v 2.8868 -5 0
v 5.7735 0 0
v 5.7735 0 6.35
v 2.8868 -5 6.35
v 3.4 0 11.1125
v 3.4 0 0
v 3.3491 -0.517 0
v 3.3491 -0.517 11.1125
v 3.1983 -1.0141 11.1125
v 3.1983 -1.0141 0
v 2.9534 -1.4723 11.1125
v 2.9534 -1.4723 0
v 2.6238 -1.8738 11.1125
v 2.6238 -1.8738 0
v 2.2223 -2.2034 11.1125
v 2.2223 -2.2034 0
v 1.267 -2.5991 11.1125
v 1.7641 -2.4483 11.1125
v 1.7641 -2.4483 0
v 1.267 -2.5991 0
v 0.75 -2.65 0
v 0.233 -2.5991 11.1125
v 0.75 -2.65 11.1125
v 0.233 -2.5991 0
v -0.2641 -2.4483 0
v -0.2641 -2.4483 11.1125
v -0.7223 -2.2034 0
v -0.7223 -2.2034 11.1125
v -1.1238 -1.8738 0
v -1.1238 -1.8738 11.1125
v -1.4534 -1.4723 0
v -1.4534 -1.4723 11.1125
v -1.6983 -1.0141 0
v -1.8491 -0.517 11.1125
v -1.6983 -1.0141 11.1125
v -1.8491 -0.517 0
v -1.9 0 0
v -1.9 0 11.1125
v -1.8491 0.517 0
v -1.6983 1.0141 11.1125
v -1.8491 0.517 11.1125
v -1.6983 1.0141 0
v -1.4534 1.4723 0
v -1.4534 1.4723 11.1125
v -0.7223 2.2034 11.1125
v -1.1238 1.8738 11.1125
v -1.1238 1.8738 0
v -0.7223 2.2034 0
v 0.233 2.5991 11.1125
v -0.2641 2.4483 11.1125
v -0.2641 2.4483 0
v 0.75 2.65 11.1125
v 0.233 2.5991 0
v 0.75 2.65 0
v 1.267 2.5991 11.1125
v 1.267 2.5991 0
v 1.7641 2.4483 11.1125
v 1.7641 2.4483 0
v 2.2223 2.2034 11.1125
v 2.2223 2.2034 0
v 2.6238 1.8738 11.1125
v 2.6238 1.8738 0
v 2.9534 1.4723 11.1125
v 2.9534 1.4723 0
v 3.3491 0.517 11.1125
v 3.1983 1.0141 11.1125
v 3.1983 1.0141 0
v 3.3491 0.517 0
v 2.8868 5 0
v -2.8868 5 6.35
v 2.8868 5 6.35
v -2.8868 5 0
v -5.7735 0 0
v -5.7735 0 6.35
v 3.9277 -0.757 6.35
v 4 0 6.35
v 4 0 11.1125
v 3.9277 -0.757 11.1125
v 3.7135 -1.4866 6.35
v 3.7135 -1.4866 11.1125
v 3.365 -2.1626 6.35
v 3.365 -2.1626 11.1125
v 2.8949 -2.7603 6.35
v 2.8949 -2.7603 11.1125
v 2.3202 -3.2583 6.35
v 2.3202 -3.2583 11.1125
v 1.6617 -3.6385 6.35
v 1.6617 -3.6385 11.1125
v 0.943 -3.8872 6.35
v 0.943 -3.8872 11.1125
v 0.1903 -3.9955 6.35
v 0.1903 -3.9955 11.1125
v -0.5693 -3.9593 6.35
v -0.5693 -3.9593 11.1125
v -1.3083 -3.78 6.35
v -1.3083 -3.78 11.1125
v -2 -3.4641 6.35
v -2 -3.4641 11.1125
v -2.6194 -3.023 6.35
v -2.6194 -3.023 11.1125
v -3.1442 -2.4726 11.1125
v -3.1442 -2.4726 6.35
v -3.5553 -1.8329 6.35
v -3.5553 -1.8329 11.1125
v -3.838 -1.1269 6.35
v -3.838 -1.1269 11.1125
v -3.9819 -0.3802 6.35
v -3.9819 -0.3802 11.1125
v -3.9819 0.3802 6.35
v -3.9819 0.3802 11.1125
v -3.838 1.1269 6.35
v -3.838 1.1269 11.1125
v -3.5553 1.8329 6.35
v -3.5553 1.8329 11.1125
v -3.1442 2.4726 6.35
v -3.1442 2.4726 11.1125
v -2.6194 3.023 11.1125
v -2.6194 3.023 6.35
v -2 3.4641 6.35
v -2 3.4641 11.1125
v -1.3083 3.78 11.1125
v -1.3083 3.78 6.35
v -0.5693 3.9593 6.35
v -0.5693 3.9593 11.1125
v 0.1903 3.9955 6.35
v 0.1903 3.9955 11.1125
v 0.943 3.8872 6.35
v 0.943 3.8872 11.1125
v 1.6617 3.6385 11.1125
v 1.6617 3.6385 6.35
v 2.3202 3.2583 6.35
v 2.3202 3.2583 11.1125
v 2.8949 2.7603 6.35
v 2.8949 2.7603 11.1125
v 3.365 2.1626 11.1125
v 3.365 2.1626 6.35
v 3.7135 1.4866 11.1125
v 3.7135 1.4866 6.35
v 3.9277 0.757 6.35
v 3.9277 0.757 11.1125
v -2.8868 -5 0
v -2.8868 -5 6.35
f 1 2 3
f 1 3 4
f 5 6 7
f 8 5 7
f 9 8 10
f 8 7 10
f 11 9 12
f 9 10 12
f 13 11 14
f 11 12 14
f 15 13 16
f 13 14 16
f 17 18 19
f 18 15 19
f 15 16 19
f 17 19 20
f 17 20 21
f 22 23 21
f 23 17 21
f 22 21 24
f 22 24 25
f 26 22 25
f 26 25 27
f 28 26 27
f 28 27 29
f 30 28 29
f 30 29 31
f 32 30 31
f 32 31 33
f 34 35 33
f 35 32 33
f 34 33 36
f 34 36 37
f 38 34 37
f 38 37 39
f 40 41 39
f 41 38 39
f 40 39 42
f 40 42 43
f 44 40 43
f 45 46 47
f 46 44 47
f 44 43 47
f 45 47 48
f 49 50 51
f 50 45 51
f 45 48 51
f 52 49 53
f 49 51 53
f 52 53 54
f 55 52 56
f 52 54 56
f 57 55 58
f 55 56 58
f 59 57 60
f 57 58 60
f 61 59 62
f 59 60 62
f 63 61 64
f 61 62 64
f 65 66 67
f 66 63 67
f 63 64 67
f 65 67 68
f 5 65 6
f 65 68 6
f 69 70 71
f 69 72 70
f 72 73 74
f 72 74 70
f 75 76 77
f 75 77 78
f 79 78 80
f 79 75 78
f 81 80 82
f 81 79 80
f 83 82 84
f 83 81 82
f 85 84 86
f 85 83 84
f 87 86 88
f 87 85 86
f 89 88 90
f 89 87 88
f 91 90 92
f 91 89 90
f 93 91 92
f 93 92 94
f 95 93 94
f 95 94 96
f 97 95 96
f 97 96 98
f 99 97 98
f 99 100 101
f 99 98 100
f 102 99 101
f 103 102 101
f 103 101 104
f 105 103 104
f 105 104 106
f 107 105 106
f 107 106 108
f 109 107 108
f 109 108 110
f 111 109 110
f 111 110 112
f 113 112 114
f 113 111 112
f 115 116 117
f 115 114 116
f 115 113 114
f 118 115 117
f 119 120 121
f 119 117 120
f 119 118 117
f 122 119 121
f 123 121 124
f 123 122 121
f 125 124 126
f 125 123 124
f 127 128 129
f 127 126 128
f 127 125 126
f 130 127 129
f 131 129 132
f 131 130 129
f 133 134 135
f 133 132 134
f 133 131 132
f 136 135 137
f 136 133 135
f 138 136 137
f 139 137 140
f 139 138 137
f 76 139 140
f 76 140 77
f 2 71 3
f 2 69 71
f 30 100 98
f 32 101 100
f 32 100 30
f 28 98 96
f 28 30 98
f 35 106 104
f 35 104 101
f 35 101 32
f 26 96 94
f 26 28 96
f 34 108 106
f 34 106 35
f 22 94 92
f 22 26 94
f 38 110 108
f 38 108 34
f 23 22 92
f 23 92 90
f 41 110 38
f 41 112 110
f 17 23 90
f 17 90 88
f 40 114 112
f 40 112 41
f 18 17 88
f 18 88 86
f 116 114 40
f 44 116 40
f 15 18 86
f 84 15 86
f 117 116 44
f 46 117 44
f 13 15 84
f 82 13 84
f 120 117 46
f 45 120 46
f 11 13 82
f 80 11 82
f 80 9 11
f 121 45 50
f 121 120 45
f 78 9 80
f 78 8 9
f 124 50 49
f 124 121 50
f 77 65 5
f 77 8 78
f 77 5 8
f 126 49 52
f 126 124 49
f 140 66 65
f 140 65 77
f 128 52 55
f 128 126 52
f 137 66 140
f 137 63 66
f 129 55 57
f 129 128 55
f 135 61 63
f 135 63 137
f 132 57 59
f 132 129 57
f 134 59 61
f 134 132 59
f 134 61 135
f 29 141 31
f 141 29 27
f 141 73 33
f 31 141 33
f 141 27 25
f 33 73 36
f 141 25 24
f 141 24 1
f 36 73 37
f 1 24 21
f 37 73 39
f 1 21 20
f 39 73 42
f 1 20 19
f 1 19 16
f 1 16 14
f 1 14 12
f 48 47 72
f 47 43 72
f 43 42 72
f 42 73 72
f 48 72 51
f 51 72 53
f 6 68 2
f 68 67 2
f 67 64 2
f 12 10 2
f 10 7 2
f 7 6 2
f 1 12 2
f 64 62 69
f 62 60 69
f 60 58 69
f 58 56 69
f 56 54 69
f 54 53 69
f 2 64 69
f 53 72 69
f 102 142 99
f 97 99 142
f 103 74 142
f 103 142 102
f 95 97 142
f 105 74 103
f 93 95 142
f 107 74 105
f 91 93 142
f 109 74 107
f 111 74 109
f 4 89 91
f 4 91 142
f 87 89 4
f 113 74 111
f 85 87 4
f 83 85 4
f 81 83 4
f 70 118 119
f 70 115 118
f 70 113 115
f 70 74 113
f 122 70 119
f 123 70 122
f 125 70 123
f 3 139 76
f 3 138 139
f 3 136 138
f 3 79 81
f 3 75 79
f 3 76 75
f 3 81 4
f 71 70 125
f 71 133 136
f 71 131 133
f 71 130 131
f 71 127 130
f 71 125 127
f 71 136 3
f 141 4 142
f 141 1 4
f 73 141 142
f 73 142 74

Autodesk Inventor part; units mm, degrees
ref_plane "YZ Plane" through (0, 0, 0) normal (1, 0, 0) x (0, 1, 0)
ref_plane "XZ Plane" through (0, 0, 0) normal (0, 1, 0) x (-1, 0, 0)
ref_plane "XY Plane" through (0, 0, 0) normal (0, 0, 1) x (1, 0, 0)
sketch "Sketch1" plane through (0, 0, 0) normal (0, 0, 1) x (1, 0, 0)
  circle A0 centre (0, 0) radius 4
  line L0 (2.8868, 5) -> (5.7735, 0)
  line L1 (5.7735, 0) -> (2.8868, -5)
  line L2 (2.8868, -5) -> (-2.8868, -5)
  line L3 (-2.8868, -5) -> (-5.7735, 0)
  line L4 (-5.7735, 0) -> (-2.8868, 5)
  line L5 (-2.8868, 5) -> (2.8868, 5)
  circle A1 centre (0.75, 0) radius 2.65
  dimension "d0" = 8
  dimension "d2" = 10
  dimension "d3" = 5.3
  dimension "d4" = 0.75
extrude "Extrusion1" add sketch "Sketch1" along normal blind 6.35 contours A0 | L0 L1 L2 L3 L4 L5
sketch "Sketch2" plane through (0, 0, 6.35) normal (0, 0, 1) x (1, 0, 0)
  circle A0 centre (0.75, 0) radius 2.65 projected
  circle A1 centre (0, 0) radius 4
  line L0 (4.0415, 7) -> (8.0829, 0)
  line L1 (8.0829, 0) -> (4.0415, -7)
  line L2 (4.0415, -7) -> (-4.0415, -7)
  line L3 (-4.0415, -7) -> (-8.0829, 0)
  line L4 (-8.0829, 0) -> (-4.0415, 7)
  line L5 (-4.0415, 7) -> (4.0415, 7)
  circle A2 centre (0.75, 0) radius 2.65
  dimension "d7" = 8
  dimension "d8" = 14
  dimension "d9" = 5.3
extrude "Extrusion2" add sketch "Sketch2" along normal blind 4.7625 contours A1
properties part number "Eccentric_Spacer"
